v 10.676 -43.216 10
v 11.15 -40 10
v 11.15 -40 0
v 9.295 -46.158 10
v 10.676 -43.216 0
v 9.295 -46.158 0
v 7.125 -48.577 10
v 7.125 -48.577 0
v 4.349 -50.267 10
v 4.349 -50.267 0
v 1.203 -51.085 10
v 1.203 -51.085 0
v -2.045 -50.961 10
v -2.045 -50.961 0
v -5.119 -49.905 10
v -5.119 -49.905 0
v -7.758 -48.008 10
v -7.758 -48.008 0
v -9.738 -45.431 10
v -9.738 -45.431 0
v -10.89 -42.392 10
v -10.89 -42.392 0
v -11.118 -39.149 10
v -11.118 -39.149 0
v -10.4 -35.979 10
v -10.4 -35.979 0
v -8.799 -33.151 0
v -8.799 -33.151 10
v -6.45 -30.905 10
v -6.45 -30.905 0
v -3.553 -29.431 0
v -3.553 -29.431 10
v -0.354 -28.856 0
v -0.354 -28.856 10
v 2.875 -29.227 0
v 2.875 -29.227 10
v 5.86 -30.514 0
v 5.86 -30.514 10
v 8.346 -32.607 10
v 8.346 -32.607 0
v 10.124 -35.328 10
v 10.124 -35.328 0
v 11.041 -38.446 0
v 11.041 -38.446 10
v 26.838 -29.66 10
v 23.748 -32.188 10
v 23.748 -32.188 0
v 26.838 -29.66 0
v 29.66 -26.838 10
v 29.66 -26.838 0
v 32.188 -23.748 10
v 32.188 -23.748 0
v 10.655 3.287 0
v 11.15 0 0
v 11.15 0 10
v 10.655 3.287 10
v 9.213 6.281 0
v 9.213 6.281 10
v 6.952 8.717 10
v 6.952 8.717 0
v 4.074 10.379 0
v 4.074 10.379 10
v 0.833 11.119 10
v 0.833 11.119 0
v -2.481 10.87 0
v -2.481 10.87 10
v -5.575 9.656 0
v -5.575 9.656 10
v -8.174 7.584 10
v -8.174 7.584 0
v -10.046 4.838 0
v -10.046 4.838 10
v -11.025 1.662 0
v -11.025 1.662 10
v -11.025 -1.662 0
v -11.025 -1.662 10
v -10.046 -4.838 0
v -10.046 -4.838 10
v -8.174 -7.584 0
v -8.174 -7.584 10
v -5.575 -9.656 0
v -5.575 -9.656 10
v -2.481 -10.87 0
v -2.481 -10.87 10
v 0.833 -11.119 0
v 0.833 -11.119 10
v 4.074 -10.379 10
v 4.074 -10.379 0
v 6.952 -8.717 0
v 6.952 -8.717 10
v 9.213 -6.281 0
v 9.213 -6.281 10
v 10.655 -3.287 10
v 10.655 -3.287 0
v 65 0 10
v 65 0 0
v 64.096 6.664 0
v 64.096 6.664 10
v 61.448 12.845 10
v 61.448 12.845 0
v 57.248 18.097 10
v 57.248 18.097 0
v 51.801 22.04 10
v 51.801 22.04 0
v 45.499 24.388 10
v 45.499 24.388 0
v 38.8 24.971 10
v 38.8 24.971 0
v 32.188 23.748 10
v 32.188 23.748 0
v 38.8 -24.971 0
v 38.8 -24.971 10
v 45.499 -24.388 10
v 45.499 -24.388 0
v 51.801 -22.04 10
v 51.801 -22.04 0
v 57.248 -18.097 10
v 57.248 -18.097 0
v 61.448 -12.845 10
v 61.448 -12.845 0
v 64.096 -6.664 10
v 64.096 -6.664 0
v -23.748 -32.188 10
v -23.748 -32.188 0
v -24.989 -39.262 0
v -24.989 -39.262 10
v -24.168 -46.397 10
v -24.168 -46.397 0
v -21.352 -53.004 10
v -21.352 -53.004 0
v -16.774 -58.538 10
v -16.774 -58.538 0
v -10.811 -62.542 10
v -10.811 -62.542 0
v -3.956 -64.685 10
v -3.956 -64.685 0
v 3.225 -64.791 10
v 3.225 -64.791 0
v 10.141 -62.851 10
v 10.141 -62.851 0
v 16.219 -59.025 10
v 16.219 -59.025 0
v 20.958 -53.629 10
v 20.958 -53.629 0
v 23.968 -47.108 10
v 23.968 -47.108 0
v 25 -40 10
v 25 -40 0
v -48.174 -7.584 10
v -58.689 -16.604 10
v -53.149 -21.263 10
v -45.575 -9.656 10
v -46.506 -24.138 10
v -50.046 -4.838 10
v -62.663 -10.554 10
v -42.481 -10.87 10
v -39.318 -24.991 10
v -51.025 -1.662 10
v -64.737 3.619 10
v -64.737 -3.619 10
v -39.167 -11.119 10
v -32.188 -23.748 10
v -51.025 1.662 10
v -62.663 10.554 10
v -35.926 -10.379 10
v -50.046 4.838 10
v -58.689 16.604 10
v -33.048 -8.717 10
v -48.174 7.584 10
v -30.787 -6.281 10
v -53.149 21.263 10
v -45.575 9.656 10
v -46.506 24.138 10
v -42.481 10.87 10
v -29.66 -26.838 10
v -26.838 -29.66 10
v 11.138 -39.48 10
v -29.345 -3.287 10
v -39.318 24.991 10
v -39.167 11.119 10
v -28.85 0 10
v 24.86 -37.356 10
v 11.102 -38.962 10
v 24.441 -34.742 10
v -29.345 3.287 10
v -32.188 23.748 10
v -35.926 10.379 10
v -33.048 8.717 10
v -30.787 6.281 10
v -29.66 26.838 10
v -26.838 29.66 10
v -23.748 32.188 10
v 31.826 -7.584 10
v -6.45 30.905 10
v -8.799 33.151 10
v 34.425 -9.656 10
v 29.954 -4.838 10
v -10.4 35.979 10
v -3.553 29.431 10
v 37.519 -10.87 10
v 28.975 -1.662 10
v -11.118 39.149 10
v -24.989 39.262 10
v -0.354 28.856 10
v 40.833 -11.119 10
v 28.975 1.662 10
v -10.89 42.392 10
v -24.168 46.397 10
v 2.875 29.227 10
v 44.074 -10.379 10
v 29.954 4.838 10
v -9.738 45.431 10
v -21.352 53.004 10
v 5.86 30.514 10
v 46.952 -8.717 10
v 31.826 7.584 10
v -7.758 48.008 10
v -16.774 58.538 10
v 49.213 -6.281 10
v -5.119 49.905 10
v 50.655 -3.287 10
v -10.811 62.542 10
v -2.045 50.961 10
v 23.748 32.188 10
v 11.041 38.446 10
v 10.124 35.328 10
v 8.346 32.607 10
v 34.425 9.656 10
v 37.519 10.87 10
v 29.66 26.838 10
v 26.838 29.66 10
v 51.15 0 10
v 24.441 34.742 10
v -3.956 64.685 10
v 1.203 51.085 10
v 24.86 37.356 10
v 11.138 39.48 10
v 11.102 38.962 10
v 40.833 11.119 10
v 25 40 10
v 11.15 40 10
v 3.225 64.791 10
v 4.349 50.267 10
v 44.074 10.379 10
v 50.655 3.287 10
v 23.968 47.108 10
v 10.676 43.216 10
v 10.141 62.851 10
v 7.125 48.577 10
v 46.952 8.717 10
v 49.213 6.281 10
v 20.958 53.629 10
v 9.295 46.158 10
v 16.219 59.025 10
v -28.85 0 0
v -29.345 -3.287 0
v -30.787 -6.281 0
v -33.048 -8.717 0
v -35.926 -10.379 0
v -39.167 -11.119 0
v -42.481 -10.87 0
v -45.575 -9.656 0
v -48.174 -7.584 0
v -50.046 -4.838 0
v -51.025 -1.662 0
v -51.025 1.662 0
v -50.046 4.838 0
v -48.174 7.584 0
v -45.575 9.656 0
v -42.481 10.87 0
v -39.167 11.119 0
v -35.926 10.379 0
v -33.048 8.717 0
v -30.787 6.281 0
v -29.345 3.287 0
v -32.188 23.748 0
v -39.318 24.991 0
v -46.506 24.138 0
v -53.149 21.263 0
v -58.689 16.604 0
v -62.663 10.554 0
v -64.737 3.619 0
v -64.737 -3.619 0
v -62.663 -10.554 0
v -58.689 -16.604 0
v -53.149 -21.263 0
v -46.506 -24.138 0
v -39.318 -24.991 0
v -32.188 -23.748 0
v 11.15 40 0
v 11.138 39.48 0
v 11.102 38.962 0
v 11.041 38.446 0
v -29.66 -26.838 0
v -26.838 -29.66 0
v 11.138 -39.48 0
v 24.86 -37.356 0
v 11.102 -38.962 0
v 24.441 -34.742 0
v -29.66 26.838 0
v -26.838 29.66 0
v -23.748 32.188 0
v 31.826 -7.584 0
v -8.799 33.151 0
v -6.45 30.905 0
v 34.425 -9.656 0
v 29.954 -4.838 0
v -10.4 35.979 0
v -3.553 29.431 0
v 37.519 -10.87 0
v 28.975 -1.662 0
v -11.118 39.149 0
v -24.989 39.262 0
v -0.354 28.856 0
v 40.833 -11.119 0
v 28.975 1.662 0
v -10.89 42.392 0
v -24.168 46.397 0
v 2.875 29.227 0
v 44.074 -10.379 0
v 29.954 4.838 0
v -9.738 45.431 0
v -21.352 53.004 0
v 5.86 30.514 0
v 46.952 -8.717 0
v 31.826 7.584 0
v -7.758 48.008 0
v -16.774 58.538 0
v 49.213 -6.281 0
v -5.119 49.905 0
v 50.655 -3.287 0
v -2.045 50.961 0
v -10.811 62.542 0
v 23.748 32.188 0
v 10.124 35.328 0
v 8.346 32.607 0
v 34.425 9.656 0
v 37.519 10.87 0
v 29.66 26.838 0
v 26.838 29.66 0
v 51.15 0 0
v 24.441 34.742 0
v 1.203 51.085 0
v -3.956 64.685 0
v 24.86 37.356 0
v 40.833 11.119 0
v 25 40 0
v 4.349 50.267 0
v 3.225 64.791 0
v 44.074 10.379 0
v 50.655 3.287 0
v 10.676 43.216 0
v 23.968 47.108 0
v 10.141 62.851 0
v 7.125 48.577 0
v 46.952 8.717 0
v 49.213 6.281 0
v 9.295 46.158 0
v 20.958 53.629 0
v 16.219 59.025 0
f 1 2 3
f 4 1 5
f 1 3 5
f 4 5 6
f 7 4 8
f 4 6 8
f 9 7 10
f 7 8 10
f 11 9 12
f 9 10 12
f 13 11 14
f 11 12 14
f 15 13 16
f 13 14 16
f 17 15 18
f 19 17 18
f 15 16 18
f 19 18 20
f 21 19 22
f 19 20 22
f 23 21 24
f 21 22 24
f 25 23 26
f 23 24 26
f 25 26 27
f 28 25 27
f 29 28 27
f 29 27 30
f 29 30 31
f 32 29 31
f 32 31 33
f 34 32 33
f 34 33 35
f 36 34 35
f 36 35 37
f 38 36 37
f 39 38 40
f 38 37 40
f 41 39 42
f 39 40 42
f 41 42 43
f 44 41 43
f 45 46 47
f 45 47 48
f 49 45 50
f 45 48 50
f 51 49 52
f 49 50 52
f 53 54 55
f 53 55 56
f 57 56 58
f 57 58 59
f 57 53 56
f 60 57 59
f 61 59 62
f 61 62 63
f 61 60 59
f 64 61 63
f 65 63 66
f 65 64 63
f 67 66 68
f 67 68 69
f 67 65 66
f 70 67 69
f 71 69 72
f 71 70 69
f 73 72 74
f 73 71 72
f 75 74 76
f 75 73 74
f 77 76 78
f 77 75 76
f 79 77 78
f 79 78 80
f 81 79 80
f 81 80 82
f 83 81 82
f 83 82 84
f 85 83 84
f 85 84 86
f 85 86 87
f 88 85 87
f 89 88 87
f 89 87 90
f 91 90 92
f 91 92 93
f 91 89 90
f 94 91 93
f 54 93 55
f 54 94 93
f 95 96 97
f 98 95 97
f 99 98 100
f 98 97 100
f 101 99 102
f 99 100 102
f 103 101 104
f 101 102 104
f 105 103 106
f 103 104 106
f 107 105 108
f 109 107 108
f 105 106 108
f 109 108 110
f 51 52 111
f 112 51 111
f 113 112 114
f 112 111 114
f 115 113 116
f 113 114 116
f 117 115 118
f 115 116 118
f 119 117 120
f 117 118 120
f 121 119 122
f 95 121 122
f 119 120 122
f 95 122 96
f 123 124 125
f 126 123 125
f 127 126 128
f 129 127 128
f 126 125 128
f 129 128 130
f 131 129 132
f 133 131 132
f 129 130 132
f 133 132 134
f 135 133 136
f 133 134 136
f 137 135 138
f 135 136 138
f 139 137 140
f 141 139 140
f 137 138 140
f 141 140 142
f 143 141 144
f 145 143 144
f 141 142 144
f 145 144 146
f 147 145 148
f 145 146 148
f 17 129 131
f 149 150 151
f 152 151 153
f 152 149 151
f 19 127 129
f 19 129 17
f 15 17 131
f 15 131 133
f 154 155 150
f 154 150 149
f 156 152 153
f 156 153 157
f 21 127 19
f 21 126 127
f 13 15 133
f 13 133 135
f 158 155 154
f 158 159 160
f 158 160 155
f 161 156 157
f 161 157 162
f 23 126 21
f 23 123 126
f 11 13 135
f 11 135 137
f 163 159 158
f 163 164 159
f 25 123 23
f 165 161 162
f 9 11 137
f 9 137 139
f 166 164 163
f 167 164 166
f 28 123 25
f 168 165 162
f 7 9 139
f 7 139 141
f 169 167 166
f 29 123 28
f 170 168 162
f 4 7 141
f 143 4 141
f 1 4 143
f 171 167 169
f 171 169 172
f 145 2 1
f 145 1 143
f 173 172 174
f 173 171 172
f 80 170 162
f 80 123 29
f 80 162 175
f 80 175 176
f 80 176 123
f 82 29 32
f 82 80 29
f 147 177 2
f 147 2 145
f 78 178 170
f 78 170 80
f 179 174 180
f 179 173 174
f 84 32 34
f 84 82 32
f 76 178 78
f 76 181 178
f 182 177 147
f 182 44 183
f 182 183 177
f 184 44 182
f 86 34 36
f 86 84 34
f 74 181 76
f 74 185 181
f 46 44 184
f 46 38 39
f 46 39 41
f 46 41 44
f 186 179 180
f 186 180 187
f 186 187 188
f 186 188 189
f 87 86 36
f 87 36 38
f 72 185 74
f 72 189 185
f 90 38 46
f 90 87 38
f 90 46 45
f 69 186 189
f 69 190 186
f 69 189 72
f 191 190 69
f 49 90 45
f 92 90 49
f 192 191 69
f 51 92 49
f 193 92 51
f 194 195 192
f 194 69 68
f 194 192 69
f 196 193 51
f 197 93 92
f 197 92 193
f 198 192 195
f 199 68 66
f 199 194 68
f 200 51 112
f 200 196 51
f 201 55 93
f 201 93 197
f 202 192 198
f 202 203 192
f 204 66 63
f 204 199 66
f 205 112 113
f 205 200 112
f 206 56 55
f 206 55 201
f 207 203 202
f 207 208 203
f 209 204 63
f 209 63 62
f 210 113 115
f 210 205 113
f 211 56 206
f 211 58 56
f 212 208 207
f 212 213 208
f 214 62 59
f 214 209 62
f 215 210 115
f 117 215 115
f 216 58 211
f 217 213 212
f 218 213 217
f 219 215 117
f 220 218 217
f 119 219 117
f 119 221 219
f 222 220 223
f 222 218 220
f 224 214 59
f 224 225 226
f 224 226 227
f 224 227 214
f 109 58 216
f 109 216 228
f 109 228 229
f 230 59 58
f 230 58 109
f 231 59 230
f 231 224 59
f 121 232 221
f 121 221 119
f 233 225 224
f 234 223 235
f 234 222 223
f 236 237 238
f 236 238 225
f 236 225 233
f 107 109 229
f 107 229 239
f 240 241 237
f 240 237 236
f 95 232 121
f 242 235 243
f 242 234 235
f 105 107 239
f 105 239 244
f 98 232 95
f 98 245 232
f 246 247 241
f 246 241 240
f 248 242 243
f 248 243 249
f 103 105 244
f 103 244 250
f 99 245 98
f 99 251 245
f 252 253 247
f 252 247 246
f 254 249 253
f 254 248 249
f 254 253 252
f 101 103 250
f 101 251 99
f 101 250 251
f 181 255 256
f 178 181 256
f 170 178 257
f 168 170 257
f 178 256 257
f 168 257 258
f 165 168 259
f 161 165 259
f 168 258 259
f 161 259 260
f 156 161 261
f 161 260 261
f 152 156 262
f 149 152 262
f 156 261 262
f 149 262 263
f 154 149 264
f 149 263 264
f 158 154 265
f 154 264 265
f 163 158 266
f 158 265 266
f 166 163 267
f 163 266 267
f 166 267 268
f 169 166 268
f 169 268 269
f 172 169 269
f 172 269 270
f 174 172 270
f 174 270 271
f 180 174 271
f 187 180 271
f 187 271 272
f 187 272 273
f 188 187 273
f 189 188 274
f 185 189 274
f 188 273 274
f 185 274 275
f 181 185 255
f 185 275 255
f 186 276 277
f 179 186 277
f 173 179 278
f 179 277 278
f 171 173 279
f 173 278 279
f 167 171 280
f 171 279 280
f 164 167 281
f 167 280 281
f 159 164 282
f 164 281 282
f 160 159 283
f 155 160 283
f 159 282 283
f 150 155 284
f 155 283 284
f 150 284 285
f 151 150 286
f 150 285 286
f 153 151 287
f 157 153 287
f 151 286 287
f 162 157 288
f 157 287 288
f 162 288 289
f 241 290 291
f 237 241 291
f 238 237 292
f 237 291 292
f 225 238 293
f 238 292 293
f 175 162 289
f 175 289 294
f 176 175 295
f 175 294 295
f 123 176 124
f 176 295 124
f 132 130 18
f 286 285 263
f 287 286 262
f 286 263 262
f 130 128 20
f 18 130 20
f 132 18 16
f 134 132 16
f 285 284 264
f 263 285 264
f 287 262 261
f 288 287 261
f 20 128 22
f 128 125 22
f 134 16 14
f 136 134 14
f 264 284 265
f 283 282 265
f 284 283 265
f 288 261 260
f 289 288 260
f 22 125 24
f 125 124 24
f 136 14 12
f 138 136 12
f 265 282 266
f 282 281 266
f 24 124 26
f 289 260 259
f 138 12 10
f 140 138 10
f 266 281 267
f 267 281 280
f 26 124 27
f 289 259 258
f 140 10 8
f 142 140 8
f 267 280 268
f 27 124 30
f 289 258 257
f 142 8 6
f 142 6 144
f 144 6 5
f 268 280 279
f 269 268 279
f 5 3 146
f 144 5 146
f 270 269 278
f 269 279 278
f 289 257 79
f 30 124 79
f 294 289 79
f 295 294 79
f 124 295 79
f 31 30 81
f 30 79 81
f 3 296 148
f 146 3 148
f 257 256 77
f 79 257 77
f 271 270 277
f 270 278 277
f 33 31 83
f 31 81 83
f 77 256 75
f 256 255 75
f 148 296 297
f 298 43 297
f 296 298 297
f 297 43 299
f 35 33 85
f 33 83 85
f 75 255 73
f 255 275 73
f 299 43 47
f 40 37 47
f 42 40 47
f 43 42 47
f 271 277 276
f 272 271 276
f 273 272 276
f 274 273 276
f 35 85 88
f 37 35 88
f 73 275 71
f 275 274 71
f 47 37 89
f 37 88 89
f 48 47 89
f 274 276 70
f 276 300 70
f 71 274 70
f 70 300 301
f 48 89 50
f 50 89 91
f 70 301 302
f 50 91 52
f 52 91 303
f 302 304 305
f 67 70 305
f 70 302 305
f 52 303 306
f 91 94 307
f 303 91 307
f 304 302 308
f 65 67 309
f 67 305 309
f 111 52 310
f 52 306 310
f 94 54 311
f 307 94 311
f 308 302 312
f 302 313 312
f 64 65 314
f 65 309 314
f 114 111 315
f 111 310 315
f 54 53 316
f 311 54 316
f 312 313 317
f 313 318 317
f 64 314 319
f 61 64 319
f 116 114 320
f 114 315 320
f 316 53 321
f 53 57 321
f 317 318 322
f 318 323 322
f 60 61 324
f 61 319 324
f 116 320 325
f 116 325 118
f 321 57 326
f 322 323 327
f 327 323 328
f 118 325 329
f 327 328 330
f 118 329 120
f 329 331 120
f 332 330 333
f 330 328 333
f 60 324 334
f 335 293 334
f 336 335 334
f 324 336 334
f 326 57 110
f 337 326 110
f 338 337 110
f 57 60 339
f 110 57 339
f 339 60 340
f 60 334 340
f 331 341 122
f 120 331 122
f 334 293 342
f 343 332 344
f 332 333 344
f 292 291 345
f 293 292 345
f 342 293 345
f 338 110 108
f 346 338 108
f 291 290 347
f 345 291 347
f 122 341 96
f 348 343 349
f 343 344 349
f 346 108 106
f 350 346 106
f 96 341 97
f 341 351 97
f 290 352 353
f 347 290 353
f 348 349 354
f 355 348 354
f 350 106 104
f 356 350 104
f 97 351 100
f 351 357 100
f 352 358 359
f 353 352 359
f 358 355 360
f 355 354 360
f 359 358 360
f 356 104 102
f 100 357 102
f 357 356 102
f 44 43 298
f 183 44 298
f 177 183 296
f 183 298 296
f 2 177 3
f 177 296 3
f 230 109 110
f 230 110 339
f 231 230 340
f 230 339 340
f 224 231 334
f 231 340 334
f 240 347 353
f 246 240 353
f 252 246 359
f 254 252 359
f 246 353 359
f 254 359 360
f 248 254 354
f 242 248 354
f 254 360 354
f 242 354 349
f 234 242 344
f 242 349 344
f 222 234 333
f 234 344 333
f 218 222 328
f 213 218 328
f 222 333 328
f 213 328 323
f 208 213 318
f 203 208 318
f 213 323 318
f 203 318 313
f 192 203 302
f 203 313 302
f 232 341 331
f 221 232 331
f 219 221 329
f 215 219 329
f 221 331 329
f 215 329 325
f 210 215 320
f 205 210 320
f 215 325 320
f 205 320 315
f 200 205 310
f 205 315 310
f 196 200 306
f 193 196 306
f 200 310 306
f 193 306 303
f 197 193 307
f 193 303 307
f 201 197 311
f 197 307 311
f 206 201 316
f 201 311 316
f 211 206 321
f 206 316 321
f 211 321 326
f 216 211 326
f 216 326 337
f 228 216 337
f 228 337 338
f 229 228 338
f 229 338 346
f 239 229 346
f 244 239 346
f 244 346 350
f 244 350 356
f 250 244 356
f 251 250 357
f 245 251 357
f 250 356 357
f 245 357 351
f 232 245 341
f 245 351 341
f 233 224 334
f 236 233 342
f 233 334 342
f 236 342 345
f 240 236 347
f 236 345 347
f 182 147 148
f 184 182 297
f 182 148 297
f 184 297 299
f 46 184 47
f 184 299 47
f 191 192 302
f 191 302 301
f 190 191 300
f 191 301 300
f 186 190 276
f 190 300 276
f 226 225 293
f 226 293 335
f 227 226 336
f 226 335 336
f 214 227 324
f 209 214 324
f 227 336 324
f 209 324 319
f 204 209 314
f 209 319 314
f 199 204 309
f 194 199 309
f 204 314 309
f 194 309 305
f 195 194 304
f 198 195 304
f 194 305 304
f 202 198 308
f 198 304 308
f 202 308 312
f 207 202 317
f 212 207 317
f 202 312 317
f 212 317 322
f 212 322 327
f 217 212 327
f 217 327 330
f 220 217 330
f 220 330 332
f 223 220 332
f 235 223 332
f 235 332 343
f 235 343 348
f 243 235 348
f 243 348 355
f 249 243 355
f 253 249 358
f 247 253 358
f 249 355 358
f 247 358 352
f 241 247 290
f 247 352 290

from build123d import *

# Parameters (mm, degrees)
F0_R     = 11.15
F1_DEPTH = 10


with BuildPart() as f1:
    # F0 (on Top) → F1 (new body)
    with BuildSketch(Plane.XY):
        with BuildLine():
            ThreePointArc((38.44596875, -11.0411723505), (28.85, 0), (38.44596875, 11.0411723505))
            ThreePointArc((38.44596875, 11.0411723505), (35.883662554, 17.6737874184), (32.1875, 23.74794399))
            ThreePointArc((32.1875, 23.74794399), (15, 0), (32.1875, -23.74794399))
            ThreePointArc((32.1875, -23.74794399), (35.883662554, -17.6737874184), (38.44596875, -11.0411723505))
        make_face()
        with BuildLine():
            ThreePointArc((32.1875, 23.74794399), (35.883662554, 17.6737874184), (38.44596875, 11.0411723505))
            ThreePointArc((38.44596875, 11.0411723505), (47.3142002831, 8.4157574952), (51.15, 0))
            ThreePointArc((51.15, 0), (47.3142002831, -8.4157574952), (38.44596875, -11.0411723505))
            ThreePointArc((38.44596875, -11.0411723505), (35.883662554, -17.6737874184), (32.1875, -23.74794399))
            ThreePointArc((32.1875, -23.74794399), (54.6575492494, -20.2523146825), (65, 0))
            ThreePointArc((65, 0), (54.6575492494, 20.2523146825), (32.1875, 23.74794399))
        make_face()
        with BuildLine():
            ThreePointArc((32.1875, -23.74794399), (15, 0), (32.1875, 23.74794399))
            ThreePointArc((32.1875, 23.74794399), (28.2842712475, 28.2842712475), (23.74794399, 32.1875))
            ThreePointArc((23.74794399, 32.1875), (0, 15), (-23.74794399, 32.1875))
            ThreePointArc((-23.74794399, 32.1875), (-28.2842712475, 28.2842712475), (-32.1875, 23.74794399))
            ThreePointArc((-32.1875, 23.74794399), (-19.7476853175, 14.6575492494), (-15, 0))
            ThreePointArc((-15, 0), (-19.7476853175, -14.6575492494), (-32.1875, -23.74794399))
            ThreePointArc((-32.1875, -23.74794399), (-28.2842712475, -28.2842712475), (-23.74794399, -32.1875))
            ThreePointArc((-23.74794399, -32.1875), (0, -15), (23.74794399, -32.1875))
            ThreePointArc((23.74794399, -32.1875), (28.2842712475, -28.2842712475), (32.1875, -23.74794399))
        make_face()
        Circle(F0_R, mode=Mode.SUBTRACT)
        with BuildLine():
            ThreePointArc((-23.74794399, 32.1875), (0, 15), (23.74794399, 32.1875))
            ThreePointArc((23.74794399, 32.1875), (17.6737874184, 35.883662554), (11.0411723505, 38.44596875))
            ThreePointArc((11.0411723505, 38.44596875), (0, 28.85), (-11.0411723505, 38.44596875))
            ThreePointArc((-11.0411723505, 38.44596875), (-17.6737874184, 35.883662554), (-23.74794399, 32.1875))
        make_face()
        with BuildLine():
            ThreePointArc((11.0411723505, 38.44596875), (17.6737874184, 35.883662554), (23.74794399, 32.1875))
            ThreePointArc((23.74794399, 32.1875), (24.6850015166, 36.0439034231), (25, 40))
            ThreePointArc((25, 40), (-3.9560965769, 64.6850015166), (-23.74794399, 32.1875))
            ThreePointArc((-23.74794399, 32.1875), (-17.6737874184, 35.883662554), (-11.0411723505, 38.44596875))
            ThreePointArc((-11.0411723505, 38.44596875), (-0.7789185746, 51.1227598128), (11.15, 40))
            ThreePointArc((11.15, 40), (11.1227598128, 39.2210814254), (11.0411723505, 38.44596875))
        make_face()
        with BuildLine():
            ThreePointArc((25, -40), (24.6850015166, -36.0439034231), (23.74794399, -32.1875))
            ThreePointArc((23.74794399, -32.1875), (17.6737874184, -35.883662554), (11.0411723505, -38.44596875))
            ThreePointArc((11.0411723505, -38.44596875), (11.1227598128, -39.2210814254), (11.15, -40))
            ThreePointArc((11.15, -40), (-0.7789185746, -51.1227598128), (-11.0411723505, -38.44596875))
            ThreePointArc((-11.0411723505, -38.44596875), (-17.6737874184, -35.883662554), (-23.74794399, -32.1875))
            ThreePointArc((-23.74794399, -32.1875), (-3.9560965769, -64.6850015166), (25, -40))
        make_face()
        with BuildLine():
            ThreePointArc((11.0411723505, -38.44596875), (17.6737874184, -35.883662554), (23.74794399, -32.1875))
            ThreePointArc((23.74794399, -32.1875), (0, -15), (-23.74794399, -32.1875))
            ThreePointArc((-23.74794399, -32.1875), (-17.6737874184, -35.883662554), (-11.0411723505, -38.44596875))
            ThreePointArc((-11.0411723505, -38.44596875), (0, -28.85), (11.0411723505, -38.44596875))
        make_face()
        with BuildLine():
            ThreePointArc((-15, 0), (-19.7476853175, 14.6575492494), (-32.1875, 23.74794399))
            ThreePointArc((-32.1875, 23.74794399), (-35.883662554, 17.6737874184), (-38.44596875, 11.0411723505))
            ThreePointArc((-38.44596875, 11.0411723505), (-31.5842425048, 7.3142002831), (-28.85, 0))
            ThreePointArc((-28.85, 0), (-31.5842425048, -7.3142002831), (-38.44596875, -11.0411723505))
            ThreePointArc((-38.44596875, -11.0411723505), (-35.883662554, -17.6737874184), (-32.1875, -23.74794399))
            ThreePointArc((-32.1875, -23.74794399), (-19.7476853175, -14.6575492494), (-15, 0))
        make_face()
        with BuildLine():
            ThreePointArc((-38.44596875, 11.0411723505), (-35.883662554, 17.6737874184), (-32.1875, 23.74794399))
            ThreePointArc((-32.1875, 23.74794399), (-65, 0), (-32.1875, -23.74794399))
            ThreePointArc((-32.1875, -23.74794399), (-35.883662554, -17.6737874184), (-38.44596875, -11.0411723505))
            ThreePointArc((-38.44596875, -11.0411723505), (-51.15, 0), (-38.44596875, 11.0411723505))
        make_face()
    extrude(amount=F1_DEPTH)


solid = f1.part
